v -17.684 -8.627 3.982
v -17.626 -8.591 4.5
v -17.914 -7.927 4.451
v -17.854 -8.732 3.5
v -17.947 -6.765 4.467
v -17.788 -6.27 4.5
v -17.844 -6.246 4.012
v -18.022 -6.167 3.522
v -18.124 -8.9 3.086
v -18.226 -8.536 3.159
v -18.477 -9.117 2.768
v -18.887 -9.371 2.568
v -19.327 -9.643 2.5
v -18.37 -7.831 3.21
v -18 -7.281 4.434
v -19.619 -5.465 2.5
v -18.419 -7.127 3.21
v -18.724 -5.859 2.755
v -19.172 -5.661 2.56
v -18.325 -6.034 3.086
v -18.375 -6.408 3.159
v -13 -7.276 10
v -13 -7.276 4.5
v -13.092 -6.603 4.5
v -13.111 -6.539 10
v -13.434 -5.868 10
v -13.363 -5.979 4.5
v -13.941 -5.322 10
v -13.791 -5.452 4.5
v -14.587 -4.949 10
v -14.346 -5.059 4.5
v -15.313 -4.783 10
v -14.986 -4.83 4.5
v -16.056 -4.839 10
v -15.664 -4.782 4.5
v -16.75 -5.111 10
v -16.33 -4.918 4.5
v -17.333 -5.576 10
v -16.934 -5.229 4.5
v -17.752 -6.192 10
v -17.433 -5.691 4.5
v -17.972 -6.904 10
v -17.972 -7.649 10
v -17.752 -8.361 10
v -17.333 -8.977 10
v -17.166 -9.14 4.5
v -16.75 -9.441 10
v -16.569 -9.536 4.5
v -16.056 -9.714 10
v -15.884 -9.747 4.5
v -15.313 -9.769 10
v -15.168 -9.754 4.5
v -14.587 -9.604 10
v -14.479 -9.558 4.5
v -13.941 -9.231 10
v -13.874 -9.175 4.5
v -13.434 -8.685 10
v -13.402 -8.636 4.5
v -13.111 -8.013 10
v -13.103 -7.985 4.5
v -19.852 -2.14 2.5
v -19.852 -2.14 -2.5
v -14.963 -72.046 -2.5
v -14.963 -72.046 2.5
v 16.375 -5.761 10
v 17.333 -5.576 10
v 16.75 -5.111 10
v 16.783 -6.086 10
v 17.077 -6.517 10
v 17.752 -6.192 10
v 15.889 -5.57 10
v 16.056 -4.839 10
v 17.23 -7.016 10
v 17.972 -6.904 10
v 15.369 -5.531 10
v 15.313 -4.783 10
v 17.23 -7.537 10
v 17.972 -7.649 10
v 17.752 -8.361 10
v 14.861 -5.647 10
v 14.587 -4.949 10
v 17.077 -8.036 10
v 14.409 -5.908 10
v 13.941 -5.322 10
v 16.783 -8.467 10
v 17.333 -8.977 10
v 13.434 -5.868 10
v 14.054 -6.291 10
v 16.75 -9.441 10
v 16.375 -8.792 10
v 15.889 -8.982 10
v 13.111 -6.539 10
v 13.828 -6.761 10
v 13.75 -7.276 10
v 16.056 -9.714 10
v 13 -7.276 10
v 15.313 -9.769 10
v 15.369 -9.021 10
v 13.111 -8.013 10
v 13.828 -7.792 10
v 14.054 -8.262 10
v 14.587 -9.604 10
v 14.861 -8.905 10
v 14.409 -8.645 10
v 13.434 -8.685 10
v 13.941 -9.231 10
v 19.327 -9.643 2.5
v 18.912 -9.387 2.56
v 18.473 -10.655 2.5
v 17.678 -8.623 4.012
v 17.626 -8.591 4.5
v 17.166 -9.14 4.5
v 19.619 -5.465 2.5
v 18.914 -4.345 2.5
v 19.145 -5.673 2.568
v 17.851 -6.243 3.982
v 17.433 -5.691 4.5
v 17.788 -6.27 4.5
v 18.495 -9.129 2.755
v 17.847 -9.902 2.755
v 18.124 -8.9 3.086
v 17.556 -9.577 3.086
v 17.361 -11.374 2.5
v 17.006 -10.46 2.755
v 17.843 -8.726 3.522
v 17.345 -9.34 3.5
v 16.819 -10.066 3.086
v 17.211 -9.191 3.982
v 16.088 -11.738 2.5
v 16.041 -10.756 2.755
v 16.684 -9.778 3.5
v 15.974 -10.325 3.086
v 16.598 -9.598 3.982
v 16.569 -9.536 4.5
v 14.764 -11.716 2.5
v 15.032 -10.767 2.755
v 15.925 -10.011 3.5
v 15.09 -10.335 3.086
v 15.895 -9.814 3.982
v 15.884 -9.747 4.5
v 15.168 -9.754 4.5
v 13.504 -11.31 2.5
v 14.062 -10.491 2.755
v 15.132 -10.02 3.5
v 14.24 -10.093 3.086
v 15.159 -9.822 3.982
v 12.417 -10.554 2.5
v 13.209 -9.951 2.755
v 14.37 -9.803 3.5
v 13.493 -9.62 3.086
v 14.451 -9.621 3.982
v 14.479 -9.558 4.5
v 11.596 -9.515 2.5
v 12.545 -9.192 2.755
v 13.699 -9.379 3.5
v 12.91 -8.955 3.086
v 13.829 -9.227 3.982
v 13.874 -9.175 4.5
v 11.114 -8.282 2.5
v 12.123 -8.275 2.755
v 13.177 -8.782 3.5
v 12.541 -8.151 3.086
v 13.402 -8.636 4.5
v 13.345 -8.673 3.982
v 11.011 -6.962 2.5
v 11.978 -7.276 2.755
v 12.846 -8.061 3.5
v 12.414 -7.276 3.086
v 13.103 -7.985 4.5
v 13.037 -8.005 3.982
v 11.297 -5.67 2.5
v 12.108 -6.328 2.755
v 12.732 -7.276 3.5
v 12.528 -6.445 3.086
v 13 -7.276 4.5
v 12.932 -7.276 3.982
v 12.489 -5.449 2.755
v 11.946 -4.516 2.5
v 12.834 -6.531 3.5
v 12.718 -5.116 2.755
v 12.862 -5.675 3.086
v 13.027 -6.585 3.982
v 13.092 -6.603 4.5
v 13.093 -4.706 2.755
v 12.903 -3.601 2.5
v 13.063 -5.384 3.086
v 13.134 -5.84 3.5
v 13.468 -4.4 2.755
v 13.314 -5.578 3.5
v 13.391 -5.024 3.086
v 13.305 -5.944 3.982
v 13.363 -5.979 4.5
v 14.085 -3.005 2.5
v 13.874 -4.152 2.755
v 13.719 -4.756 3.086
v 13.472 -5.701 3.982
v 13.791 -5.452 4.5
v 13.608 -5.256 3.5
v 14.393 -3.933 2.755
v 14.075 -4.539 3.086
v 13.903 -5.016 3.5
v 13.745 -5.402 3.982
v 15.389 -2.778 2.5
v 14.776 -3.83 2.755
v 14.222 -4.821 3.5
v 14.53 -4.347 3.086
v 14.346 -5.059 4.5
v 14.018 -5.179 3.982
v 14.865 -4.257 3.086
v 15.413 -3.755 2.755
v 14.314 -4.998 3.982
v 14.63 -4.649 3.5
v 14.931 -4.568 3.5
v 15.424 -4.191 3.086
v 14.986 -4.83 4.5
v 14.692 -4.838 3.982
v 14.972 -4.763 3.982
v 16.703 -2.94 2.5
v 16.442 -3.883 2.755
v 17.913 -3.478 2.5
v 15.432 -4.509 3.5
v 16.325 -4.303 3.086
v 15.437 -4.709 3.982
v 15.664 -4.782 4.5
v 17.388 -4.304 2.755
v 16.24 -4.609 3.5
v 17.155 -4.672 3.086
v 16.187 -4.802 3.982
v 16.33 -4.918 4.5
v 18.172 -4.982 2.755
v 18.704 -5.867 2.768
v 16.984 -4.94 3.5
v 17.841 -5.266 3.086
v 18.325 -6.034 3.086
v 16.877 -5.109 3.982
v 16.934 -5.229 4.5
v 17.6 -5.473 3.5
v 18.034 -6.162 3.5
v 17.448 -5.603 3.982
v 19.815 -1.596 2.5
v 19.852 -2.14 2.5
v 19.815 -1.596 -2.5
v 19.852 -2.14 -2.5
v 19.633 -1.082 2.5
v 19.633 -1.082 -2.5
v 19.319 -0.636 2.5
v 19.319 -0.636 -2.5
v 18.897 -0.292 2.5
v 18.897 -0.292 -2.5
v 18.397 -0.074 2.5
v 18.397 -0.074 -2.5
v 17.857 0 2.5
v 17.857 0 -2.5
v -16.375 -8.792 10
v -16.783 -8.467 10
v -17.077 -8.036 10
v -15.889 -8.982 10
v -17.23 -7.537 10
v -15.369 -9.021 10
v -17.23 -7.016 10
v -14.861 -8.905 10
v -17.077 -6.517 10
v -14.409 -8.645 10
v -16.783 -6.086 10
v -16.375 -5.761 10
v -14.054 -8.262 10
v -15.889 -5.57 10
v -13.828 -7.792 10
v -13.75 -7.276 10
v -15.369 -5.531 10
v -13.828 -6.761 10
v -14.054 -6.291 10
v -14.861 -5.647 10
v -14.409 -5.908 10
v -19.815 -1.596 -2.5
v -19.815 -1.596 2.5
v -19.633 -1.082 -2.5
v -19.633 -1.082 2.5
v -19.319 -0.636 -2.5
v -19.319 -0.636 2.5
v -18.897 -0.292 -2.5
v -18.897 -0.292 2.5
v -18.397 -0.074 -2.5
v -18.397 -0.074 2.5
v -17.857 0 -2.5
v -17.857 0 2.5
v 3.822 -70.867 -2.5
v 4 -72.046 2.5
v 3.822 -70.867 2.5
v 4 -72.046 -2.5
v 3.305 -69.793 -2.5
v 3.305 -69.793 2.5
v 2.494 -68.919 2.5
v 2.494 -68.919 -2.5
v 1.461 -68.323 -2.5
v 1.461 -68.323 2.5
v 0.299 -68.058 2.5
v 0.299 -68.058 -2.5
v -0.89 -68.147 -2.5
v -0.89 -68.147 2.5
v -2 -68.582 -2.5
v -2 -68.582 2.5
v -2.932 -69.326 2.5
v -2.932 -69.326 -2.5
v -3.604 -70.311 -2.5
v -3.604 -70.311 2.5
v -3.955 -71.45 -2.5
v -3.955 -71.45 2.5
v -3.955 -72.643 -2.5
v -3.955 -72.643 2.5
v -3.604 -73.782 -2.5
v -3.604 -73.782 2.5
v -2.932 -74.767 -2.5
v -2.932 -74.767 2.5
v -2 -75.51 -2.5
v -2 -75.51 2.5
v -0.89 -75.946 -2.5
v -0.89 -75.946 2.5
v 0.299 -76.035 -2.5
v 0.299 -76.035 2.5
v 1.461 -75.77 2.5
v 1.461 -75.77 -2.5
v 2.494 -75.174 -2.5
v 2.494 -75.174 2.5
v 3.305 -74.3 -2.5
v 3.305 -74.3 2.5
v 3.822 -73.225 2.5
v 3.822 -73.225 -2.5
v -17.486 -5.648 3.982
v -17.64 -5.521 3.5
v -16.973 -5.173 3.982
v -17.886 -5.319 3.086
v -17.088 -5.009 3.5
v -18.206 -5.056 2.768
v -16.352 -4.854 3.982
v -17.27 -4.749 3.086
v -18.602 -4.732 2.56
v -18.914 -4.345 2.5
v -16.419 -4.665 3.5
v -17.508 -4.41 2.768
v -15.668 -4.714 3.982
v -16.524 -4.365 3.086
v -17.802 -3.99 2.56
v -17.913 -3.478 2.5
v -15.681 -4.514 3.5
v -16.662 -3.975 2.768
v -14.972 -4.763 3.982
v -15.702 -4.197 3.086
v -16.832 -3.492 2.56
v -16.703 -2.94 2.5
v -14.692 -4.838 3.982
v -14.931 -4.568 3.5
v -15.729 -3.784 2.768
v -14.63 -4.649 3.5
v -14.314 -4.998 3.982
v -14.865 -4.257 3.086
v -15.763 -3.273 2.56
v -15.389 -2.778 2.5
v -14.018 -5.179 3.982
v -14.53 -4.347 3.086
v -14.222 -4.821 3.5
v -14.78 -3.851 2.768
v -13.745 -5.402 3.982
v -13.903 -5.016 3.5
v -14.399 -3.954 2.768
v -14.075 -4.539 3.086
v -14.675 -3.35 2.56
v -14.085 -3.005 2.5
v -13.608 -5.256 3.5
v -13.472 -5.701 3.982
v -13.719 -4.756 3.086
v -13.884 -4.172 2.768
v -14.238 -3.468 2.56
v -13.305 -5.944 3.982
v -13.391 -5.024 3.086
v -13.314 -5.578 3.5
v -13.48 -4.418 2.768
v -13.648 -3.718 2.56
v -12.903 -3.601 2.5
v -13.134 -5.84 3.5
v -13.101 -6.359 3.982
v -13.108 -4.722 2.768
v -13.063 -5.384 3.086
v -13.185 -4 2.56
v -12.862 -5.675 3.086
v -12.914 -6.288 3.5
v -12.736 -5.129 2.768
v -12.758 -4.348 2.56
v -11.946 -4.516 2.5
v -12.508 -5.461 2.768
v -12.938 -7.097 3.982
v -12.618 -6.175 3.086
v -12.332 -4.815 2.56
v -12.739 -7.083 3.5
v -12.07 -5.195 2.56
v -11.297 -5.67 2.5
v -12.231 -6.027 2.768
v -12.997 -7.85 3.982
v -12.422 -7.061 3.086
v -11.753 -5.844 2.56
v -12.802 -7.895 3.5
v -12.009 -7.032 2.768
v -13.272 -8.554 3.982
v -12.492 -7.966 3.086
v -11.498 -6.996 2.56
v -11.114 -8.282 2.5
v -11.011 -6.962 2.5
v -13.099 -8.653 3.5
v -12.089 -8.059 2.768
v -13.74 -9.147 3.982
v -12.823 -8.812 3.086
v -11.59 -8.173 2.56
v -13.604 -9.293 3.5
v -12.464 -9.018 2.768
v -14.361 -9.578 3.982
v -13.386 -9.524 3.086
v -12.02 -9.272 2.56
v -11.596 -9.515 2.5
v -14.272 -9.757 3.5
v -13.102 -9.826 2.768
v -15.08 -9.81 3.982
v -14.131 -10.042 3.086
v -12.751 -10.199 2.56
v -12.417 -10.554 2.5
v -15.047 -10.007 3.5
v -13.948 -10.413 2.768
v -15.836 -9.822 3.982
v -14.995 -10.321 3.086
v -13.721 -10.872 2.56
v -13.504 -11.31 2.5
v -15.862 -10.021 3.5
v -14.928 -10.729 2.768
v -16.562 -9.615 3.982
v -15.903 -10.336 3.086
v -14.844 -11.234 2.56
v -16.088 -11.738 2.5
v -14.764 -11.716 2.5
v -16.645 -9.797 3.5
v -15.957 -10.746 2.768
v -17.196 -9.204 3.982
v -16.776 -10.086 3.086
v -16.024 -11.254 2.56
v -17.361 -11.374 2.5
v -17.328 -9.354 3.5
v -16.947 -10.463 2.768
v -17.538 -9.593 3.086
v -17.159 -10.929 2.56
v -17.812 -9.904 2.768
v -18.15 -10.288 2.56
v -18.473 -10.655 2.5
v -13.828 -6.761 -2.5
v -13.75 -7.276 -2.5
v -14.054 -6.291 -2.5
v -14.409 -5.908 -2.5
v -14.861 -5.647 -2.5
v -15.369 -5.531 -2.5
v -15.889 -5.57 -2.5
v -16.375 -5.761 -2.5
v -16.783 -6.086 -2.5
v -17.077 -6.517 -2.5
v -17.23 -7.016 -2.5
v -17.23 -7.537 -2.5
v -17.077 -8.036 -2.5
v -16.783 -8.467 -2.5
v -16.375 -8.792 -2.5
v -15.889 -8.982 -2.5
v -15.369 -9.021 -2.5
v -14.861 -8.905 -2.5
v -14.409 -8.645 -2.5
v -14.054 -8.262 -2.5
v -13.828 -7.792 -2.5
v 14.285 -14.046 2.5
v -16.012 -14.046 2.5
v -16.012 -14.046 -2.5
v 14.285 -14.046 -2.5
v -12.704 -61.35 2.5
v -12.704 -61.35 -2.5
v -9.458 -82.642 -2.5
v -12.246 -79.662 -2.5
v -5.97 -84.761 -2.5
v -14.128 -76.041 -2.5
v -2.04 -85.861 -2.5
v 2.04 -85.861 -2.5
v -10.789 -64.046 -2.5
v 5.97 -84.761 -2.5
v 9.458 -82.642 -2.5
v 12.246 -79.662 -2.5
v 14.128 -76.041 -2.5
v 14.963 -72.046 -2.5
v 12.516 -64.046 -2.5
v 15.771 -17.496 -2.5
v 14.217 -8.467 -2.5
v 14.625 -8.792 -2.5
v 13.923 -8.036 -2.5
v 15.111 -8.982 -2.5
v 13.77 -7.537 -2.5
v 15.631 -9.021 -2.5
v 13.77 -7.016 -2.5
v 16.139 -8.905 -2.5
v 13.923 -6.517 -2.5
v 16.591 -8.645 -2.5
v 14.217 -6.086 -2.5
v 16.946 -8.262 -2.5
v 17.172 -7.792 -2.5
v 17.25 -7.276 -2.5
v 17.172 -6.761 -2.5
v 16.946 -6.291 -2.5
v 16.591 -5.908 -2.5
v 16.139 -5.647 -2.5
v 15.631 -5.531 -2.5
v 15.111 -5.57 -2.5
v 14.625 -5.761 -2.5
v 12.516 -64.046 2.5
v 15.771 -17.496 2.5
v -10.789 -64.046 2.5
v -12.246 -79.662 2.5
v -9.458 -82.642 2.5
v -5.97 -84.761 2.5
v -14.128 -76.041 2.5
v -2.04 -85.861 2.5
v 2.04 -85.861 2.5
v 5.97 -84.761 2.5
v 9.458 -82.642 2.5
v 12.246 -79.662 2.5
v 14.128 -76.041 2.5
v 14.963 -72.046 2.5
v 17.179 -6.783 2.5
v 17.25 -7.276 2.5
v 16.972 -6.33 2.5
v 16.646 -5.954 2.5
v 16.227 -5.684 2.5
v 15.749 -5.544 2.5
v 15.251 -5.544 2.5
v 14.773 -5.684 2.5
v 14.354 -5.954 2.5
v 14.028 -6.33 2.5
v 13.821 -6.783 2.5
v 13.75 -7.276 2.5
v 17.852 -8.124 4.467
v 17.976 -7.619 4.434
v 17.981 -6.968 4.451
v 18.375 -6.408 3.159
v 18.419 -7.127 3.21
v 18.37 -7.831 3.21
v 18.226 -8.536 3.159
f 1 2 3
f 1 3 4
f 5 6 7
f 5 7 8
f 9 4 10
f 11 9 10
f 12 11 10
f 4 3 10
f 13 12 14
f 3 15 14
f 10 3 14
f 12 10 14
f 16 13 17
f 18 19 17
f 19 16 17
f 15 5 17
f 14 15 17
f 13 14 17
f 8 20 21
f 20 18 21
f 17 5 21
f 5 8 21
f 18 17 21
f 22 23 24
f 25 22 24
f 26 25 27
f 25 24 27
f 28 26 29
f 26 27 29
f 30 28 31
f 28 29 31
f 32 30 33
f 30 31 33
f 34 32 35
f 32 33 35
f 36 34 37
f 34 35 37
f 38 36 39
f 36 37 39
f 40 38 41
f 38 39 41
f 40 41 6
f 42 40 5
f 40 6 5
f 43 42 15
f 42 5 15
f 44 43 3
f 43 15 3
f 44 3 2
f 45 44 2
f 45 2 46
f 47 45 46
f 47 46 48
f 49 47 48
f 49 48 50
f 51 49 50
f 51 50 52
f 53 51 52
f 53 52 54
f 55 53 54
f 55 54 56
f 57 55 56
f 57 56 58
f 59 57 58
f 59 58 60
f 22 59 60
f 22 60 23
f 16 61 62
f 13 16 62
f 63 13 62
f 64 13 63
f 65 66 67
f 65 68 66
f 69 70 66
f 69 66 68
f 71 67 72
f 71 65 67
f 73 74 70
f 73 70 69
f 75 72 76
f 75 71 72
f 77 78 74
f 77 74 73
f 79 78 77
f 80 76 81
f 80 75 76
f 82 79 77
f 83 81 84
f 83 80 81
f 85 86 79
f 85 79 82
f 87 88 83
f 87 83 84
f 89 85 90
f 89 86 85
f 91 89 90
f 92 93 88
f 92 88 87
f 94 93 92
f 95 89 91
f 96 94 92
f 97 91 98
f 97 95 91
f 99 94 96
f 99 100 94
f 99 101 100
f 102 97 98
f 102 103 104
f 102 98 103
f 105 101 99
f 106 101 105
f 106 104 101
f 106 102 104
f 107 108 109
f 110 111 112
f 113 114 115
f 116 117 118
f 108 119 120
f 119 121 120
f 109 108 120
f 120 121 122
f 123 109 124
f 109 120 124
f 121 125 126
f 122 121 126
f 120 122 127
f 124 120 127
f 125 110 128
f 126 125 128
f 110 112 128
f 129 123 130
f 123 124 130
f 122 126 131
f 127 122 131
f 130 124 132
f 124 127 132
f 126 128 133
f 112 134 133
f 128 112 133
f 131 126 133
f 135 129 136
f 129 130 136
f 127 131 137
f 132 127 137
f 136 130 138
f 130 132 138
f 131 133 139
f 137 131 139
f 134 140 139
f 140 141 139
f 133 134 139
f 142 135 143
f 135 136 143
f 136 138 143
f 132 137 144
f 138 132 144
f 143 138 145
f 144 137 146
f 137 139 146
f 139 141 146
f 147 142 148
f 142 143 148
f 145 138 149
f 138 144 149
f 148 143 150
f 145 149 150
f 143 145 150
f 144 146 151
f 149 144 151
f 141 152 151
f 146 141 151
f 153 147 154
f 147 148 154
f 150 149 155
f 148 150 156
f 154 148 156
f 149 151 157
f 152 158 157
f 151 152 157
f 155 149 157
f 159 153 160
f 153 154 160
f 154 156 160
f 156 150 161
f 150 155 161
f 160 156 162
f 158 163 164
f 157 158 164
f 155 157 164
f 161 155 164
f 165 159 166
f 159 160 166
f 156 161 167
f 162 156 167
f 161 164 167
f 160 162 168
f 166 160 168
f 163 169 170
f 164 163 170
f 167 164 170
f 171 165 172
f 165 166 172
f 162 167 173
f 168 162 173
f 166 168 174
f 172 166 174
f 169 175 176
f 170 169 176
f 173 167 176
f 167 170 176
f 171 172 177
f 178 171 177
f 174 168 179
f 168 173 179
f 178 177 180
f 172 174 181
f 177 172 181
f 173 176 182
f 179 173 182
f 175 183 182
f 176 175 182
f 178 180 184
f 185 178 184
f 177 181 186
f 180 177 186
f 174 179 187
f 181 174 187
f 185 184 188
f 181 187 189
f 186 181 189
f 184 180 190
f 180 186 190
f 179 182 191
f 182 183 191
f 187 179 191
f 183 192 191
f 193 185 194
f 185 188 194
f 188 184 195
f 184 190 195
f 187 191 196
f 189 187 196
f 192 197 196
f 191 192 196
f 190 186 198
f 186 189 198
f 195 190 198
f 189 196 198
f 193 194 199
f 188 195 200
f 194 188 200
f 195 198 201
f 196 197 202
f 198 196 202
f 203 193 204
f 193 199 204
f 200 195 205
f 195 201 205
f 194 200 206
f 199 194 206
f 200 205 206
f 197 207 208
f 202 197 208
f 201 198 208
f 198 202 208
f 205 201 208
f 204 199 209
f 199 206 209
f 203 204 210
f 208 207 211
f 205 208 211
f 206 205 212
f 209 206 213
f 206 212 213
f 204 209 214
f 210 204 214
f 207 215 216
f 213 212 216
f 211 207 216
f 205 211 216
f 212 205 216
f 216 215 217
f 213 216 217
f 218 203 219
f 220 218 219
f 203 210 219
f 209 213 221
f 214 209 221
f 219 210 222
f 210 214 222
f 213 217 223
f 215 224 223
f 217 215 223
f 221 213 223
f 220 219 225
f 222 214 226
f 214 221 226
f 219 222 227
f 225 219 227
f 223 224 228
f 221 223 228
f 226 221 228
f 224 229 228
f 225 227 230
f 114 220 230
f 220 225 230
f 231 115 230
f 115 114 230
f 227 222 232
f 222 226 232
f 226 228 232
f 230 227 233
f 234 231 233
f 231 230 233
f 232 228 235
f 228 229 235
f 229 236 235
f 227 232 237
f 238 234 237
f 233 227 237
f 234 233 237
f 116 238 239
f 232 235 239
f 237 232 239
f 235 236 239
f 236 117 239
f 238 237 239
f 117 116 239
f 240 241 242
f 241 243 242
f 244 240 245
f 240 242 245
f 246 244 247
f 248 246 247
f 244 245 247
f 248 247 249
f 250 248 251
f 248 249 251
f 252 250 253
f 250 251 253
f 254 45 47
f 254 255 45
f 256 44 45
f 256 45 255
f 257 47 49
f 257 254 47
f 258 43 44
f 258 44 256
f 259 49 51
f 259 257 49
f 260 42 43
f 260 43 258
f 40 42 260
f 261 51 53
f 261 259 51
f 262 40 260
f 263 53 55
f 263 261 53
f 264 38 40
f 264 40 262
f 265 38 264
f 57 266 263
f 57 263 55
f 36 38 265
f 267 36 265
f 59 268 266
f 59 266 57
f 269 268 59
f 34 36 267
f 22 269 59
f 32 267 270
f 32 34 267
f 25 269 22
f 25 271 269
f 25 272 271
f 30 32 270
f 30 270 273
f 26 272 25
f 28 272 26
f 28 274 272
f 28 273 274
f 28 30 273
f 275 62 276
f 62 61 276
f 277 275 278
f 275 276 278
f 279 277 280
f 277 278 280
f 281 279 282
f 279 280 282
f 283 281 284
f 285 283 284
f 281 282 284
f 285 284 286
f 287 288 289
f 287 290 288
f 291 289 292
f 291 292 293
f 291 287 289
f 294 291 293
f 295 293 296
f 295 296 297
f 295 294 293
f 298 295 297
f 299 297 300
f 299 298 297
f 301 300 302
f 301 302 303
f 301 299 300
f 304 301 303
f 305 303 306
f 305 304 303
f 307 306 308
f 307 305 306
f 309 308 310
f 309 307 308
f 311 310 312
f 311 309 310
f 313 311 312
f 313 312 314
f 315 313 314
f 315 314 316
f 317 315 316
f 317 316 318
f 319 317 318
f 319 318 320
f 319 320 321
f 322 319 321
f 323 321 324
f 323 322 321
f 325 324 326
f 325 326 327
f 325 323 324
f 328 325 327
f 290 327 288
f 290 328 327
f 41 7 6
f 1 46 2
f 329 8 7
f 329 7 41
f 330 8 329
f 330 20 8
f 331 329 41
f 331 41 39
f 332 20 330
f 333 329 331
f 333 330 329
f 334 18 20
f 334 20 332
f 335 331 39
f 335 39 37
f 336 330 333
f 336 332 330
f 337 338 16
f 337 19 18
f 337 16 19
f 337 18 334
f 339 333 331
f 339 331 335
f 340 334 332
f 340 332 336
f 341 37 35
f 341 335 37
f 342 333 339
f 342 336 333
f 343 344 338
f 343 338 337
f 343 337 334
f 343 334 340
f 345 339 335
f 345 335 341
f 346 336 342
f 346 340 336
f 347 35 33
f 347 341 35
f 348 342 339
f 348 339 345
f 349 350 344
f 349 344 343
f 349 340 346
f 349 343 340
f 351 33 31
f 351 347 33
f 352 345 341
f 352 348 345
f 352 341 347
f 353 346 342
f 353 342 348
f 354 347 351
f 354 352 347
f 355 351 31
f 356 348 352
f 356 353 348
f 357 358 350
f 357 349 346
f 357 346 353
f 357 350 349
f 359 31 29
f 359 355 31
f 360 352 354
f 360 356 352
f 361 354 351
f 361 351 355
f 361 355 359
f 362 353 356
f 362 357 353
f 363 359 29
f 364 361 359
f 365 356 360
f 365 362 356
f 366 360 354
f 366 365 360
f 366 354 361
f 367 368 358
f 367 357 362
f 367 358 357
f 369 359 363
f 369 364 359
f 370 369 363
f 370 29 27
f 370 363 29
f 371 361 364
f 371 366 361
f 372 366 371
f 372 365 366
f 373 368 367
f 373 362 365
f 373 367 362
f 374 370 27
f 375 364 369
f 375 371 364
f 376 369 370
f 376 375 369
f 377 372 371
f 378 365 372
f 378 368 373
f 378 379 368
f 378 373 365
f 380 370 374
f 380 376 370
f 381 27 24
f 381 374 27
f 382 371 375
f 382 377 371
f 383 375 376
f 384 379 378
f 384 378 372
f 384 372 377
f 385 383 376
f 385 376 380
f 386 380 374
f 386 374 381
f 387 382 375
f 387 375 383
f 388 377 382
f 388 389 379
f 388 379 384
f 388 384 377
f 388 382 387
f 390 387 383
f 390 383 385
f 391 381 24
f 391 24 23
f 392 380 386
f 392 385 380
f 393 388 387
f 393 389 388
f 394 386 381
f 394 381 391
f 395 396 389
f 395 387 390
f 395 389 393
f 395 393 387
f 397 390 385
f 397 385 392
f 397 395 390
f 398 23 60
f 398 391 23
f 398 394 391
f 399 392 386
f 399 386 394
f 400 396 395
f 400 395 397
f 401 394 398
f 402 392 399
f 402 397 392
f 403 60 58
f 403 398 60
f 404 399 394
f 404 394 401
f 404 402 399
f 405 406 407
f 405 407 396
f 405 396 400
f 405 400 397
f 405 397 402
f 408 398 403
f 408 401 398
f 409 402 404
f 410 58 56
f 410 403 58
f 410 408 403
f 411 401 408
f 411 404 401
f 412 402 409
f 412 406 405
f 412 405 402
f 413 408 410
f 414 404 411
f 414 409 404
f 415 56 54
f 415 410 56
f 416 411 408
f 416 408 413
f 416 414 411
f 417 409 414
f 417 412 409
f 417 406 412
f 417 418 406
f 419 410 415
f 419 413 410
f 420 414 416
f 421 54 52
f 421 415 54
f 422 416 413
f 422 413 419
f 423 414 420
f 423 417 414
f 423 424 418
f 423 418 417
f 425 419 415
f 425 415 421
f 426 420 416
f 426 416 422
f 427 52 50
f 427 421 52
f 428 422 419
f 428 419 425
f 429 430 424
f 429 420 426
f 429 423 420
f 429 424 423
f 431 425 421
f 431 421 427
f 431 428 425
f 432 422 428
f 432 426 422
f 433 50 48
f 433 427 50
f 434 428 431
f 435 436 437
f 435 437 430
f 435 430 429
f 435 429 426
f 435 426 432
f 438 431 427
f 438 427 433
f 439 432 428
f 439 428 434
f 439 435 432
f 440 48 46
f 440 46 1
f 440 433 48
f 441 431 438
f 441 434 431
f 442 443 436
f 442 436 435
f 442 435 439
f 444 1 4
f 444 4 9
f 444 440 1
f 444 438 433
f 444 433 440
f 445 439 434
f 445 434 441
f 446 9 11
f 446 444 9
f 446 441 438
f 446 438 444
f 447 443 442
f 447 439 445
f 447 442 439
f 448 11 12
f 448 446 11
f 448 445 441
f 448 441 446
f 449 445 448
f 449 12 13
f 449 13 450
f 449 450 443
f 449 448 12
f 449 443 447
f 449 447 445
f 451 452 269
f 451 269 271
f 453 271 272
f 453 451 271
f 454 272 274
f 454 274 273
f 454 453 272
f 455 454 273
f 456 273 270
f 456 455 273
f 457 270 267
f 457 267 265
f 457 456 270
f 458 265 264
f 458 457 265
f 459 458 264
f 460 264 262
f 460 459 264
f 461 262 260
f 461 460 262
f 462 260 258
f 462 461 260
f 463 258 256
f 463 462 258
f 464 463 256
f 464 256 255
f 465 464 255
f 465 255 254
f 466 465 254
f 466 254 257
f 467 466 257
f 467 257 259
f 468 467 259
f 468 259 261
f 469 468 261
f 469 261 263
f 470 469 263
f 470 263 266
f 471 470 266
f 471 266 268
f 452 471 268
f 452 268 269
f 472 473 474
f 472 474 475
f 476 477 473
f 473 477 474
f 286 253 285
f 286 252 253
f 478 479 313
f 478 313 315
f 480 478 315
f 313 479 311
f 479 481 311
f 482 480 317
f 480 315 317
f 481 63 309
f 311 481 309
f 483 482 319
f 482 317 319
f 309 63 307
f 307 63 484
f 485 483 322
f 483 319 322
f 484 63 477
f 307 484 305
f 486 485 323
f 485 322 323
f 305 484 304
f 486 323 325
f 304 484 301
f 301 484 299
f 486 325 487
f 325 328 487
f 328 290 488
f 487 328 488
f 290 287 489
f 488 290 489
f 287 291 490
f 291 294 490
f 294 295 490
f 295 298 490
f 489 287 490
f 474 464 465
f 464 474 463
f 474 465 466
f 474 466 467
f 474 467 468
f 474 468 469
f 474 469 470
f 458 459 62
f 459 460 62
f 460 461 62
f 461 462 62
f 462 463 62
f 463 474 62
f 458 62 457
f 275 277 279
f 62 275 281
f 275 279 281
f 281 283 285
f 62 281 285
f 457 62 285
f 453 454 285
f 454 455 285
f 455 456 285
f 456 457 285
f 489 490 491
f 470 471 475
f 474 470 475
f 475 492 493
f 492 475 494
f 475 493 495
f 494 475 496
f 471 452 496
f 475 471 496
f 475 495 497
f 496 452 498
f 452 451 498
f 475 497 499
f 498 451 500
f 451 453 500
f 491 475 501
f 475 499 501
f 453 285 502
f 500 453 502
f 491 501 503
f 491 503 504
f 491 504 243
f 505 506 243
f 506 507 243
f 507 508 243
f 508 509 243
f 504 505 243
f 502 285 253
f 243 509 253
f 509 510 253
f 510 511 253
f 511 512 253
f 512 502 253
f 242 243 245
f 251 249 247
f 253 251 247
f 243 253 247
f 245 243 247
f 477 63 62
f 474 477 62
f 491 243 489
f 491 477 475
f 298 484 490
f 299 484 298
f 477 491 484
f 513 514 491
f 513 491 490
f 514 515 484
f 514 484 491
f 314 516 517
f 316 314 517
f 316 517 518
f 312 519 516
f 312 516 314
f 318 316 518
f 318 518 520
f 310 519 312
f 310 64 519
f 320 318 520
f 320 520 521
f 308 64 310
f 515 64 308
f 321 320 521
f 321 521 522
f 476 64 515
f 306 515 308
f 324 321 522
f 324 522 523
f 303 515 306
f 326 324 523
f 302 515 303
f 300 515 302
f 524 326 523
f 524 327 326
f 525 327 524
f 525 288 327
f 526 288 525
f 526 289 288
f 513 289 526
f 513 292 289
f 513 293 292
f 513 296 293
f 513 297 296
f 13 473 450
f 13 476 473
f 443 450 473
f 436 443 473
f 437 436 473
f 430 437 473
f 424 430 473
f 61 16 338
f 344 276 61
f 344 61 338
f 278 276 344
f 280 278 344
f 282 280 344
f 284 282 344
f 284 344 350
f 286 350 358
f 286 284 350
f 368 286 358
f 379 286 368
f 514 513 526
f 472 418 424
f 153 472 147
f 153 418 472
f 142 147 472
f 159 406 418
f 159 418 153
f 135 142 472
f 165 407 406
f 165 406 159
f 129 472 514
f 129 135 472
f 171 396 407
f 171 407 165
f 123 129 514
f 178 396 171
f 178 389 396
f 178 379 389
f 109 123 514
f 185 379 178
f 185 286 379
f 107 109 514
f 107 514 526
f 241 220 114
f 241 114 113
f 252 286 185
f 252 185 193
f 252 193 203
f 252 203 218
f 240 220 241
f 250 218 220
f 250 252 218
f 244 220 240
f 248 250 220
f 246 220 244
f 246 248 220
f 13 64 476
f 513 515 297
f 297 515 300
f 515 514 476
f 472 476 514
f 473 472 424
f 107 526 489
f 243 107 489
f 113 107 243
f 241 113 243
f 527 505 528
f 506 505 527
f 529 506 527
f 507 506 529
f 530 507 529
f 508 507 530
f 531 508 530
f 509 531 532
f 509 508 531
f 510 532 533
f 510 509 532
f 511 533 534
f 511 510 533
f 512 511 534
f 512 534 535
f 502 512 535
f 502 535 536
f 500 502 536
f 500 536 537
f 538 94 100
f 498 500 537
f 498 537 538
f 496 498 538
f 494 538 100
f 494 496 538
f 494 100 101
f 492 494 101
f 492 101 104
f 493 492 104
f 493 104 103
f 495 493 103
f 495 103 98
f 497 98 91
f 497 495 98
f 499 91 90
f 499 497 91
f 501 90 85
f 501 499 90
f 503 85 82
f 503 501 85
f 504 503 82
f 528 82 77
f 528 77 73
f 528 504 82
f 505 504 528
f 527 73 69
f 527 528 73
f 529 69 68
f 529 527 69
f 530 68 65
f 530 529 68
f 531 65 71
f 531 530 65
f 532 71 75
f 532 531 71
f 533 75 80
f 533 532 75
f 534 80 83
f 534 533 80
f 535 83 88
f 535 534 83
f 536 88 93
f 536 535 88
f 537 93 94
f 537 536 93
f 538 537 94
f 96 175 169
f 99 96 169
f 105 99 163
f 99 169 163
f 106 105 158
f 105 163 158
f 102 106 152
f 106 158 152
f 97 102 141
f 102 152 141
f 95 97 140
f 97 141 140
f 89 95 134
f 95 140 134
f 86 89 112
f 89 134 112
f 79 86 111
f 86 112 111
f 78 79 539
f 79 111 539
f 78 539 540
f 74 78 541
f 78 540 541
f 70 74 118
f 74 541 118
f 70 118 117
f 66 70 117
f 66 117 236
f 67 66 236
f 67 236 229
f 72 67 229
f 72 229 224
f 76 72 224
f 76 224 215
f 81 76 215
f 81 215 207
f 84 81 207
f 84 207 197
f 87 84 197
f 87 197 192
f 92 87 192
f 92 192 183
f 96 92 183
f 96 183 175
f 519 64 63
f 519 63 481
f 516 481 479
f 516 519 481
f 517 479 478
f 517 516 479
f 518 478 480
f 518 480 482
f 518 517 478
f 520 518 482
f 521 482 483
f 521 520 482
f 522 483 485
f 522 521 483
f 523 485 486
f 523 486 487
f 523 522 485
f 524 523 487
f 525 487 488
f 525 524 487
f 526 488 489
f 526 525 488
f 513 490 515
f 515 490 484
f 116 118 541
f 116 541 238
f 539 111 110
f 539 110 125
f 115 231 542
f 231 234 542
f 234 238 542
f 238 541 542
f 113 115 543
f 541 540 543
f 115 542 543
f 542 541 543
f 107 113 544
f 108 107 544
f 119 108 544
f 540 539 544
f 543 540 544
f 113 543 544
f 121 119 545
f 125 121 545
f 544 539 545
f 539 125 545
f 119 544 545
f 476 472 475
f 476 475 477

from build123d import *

# Parameters (mm, degrees)
CROQUIS1_R              = 4
CROQUIS1_R_2            = 1.75
SALIENTE_EXTRUIR1_DEPTH = 2.5
CROQUIS1_3_R            = 2.5
CROQUIS1_3_R_2          = 1.75
SALIENTE_EXTRUIR2_DEPTH = 10
REDONDEO1_R             = 2
REDONDEO2_R             = 2


with BuildPart() as part:
    # Croquis1 → Saliente-Extruir1 (new, symmetric)
    with BuildSketch(Plane.XY):
        with BuildLine():
            Line((20.001432119, 0), (-20.001432119, 0))
            Line((-20.001432119, 0), (-14.963460754, -72.046347106))
            ThreePointArc((-14.963460754, -72.046347106), (0, -86), (14.963460754, -72.046347106))
            Line((14.963460754, -72.046347106), (20.001432119, 0))
        make_face()
        with Locations((0, -72.046347106)):
            Circle(CROQUIS1_R, mode=Mode.SUBTRACT)
        Polygon((-12.704099543, -61.349956664), (-16.011890152, -14.046347106), (14.28491785, -14.046347106), align=None, mode=Mode.SUBTRACT)
        Polygon((12.515549555, -64.046347106), (-10.788577252, -64.046347106), (15.770666891, -17.496000466), align=None, mode=Mode.SUBTRACT)
        with Locations((-15.5, -7.276347106)):
            Circle(CROQUIS1_R_2, mode=Mode.SUBTRACT)
        with Locations((15.5, -7.276347106)):
            Circle(CROQUIS1_R_2, mode=Mode.SUBTRACT)
    extrude(amount=SALIENTE_EXTRUIR1_DEPTH, both=True)

    # Croquis1<3> → Saliente-Extruir2 (add)
    # profile 1 of 2: a face of its own
    with BuildSketch(Plane.XY):
        with Locations((-15.5, -7.276347106)):
            Circle(CROQUIS1_3_R)
        with Locations((-15.5, -7.276347106)):
            Circle(CROQUIS1_3_R_2, mode=Mode.SUBTRACT)
    # profile 2 of 2: a face of its own
    with BuildSketch(Plane.XY):
        with Locations((15.5, -7.276347106)):
            Circle(CROQUIS1_3_R)
        with Locations((15.5, -7.276347106)):
            Circle(CROQUIS1_3_R_2, mode=Mode.SUBTRACT)
    extrude(amount=SALIENTE_EXTRUIR2_DEPTH)

    # Redondeo1
    redondeo1_edges = [part.edges().sort_by_distance(p)[0] for p in [
        (13, -7.276347106, 2.5),
        (-18, -7.276347106, 2.5),
    ]]
    fillet(redondeo1_edges, radius=REDONDEO1_R)

    # Redondeo2
    redondeo2_edges = [part.edges().sort_by_distance(p)[0] for p in [
        (20.001432119, 0, 0),
        (-20.001432119, 0, 0),
    ]]
    fillet(redondeo2_edges, radius=REDONDEO2_R)


solid = part.part
